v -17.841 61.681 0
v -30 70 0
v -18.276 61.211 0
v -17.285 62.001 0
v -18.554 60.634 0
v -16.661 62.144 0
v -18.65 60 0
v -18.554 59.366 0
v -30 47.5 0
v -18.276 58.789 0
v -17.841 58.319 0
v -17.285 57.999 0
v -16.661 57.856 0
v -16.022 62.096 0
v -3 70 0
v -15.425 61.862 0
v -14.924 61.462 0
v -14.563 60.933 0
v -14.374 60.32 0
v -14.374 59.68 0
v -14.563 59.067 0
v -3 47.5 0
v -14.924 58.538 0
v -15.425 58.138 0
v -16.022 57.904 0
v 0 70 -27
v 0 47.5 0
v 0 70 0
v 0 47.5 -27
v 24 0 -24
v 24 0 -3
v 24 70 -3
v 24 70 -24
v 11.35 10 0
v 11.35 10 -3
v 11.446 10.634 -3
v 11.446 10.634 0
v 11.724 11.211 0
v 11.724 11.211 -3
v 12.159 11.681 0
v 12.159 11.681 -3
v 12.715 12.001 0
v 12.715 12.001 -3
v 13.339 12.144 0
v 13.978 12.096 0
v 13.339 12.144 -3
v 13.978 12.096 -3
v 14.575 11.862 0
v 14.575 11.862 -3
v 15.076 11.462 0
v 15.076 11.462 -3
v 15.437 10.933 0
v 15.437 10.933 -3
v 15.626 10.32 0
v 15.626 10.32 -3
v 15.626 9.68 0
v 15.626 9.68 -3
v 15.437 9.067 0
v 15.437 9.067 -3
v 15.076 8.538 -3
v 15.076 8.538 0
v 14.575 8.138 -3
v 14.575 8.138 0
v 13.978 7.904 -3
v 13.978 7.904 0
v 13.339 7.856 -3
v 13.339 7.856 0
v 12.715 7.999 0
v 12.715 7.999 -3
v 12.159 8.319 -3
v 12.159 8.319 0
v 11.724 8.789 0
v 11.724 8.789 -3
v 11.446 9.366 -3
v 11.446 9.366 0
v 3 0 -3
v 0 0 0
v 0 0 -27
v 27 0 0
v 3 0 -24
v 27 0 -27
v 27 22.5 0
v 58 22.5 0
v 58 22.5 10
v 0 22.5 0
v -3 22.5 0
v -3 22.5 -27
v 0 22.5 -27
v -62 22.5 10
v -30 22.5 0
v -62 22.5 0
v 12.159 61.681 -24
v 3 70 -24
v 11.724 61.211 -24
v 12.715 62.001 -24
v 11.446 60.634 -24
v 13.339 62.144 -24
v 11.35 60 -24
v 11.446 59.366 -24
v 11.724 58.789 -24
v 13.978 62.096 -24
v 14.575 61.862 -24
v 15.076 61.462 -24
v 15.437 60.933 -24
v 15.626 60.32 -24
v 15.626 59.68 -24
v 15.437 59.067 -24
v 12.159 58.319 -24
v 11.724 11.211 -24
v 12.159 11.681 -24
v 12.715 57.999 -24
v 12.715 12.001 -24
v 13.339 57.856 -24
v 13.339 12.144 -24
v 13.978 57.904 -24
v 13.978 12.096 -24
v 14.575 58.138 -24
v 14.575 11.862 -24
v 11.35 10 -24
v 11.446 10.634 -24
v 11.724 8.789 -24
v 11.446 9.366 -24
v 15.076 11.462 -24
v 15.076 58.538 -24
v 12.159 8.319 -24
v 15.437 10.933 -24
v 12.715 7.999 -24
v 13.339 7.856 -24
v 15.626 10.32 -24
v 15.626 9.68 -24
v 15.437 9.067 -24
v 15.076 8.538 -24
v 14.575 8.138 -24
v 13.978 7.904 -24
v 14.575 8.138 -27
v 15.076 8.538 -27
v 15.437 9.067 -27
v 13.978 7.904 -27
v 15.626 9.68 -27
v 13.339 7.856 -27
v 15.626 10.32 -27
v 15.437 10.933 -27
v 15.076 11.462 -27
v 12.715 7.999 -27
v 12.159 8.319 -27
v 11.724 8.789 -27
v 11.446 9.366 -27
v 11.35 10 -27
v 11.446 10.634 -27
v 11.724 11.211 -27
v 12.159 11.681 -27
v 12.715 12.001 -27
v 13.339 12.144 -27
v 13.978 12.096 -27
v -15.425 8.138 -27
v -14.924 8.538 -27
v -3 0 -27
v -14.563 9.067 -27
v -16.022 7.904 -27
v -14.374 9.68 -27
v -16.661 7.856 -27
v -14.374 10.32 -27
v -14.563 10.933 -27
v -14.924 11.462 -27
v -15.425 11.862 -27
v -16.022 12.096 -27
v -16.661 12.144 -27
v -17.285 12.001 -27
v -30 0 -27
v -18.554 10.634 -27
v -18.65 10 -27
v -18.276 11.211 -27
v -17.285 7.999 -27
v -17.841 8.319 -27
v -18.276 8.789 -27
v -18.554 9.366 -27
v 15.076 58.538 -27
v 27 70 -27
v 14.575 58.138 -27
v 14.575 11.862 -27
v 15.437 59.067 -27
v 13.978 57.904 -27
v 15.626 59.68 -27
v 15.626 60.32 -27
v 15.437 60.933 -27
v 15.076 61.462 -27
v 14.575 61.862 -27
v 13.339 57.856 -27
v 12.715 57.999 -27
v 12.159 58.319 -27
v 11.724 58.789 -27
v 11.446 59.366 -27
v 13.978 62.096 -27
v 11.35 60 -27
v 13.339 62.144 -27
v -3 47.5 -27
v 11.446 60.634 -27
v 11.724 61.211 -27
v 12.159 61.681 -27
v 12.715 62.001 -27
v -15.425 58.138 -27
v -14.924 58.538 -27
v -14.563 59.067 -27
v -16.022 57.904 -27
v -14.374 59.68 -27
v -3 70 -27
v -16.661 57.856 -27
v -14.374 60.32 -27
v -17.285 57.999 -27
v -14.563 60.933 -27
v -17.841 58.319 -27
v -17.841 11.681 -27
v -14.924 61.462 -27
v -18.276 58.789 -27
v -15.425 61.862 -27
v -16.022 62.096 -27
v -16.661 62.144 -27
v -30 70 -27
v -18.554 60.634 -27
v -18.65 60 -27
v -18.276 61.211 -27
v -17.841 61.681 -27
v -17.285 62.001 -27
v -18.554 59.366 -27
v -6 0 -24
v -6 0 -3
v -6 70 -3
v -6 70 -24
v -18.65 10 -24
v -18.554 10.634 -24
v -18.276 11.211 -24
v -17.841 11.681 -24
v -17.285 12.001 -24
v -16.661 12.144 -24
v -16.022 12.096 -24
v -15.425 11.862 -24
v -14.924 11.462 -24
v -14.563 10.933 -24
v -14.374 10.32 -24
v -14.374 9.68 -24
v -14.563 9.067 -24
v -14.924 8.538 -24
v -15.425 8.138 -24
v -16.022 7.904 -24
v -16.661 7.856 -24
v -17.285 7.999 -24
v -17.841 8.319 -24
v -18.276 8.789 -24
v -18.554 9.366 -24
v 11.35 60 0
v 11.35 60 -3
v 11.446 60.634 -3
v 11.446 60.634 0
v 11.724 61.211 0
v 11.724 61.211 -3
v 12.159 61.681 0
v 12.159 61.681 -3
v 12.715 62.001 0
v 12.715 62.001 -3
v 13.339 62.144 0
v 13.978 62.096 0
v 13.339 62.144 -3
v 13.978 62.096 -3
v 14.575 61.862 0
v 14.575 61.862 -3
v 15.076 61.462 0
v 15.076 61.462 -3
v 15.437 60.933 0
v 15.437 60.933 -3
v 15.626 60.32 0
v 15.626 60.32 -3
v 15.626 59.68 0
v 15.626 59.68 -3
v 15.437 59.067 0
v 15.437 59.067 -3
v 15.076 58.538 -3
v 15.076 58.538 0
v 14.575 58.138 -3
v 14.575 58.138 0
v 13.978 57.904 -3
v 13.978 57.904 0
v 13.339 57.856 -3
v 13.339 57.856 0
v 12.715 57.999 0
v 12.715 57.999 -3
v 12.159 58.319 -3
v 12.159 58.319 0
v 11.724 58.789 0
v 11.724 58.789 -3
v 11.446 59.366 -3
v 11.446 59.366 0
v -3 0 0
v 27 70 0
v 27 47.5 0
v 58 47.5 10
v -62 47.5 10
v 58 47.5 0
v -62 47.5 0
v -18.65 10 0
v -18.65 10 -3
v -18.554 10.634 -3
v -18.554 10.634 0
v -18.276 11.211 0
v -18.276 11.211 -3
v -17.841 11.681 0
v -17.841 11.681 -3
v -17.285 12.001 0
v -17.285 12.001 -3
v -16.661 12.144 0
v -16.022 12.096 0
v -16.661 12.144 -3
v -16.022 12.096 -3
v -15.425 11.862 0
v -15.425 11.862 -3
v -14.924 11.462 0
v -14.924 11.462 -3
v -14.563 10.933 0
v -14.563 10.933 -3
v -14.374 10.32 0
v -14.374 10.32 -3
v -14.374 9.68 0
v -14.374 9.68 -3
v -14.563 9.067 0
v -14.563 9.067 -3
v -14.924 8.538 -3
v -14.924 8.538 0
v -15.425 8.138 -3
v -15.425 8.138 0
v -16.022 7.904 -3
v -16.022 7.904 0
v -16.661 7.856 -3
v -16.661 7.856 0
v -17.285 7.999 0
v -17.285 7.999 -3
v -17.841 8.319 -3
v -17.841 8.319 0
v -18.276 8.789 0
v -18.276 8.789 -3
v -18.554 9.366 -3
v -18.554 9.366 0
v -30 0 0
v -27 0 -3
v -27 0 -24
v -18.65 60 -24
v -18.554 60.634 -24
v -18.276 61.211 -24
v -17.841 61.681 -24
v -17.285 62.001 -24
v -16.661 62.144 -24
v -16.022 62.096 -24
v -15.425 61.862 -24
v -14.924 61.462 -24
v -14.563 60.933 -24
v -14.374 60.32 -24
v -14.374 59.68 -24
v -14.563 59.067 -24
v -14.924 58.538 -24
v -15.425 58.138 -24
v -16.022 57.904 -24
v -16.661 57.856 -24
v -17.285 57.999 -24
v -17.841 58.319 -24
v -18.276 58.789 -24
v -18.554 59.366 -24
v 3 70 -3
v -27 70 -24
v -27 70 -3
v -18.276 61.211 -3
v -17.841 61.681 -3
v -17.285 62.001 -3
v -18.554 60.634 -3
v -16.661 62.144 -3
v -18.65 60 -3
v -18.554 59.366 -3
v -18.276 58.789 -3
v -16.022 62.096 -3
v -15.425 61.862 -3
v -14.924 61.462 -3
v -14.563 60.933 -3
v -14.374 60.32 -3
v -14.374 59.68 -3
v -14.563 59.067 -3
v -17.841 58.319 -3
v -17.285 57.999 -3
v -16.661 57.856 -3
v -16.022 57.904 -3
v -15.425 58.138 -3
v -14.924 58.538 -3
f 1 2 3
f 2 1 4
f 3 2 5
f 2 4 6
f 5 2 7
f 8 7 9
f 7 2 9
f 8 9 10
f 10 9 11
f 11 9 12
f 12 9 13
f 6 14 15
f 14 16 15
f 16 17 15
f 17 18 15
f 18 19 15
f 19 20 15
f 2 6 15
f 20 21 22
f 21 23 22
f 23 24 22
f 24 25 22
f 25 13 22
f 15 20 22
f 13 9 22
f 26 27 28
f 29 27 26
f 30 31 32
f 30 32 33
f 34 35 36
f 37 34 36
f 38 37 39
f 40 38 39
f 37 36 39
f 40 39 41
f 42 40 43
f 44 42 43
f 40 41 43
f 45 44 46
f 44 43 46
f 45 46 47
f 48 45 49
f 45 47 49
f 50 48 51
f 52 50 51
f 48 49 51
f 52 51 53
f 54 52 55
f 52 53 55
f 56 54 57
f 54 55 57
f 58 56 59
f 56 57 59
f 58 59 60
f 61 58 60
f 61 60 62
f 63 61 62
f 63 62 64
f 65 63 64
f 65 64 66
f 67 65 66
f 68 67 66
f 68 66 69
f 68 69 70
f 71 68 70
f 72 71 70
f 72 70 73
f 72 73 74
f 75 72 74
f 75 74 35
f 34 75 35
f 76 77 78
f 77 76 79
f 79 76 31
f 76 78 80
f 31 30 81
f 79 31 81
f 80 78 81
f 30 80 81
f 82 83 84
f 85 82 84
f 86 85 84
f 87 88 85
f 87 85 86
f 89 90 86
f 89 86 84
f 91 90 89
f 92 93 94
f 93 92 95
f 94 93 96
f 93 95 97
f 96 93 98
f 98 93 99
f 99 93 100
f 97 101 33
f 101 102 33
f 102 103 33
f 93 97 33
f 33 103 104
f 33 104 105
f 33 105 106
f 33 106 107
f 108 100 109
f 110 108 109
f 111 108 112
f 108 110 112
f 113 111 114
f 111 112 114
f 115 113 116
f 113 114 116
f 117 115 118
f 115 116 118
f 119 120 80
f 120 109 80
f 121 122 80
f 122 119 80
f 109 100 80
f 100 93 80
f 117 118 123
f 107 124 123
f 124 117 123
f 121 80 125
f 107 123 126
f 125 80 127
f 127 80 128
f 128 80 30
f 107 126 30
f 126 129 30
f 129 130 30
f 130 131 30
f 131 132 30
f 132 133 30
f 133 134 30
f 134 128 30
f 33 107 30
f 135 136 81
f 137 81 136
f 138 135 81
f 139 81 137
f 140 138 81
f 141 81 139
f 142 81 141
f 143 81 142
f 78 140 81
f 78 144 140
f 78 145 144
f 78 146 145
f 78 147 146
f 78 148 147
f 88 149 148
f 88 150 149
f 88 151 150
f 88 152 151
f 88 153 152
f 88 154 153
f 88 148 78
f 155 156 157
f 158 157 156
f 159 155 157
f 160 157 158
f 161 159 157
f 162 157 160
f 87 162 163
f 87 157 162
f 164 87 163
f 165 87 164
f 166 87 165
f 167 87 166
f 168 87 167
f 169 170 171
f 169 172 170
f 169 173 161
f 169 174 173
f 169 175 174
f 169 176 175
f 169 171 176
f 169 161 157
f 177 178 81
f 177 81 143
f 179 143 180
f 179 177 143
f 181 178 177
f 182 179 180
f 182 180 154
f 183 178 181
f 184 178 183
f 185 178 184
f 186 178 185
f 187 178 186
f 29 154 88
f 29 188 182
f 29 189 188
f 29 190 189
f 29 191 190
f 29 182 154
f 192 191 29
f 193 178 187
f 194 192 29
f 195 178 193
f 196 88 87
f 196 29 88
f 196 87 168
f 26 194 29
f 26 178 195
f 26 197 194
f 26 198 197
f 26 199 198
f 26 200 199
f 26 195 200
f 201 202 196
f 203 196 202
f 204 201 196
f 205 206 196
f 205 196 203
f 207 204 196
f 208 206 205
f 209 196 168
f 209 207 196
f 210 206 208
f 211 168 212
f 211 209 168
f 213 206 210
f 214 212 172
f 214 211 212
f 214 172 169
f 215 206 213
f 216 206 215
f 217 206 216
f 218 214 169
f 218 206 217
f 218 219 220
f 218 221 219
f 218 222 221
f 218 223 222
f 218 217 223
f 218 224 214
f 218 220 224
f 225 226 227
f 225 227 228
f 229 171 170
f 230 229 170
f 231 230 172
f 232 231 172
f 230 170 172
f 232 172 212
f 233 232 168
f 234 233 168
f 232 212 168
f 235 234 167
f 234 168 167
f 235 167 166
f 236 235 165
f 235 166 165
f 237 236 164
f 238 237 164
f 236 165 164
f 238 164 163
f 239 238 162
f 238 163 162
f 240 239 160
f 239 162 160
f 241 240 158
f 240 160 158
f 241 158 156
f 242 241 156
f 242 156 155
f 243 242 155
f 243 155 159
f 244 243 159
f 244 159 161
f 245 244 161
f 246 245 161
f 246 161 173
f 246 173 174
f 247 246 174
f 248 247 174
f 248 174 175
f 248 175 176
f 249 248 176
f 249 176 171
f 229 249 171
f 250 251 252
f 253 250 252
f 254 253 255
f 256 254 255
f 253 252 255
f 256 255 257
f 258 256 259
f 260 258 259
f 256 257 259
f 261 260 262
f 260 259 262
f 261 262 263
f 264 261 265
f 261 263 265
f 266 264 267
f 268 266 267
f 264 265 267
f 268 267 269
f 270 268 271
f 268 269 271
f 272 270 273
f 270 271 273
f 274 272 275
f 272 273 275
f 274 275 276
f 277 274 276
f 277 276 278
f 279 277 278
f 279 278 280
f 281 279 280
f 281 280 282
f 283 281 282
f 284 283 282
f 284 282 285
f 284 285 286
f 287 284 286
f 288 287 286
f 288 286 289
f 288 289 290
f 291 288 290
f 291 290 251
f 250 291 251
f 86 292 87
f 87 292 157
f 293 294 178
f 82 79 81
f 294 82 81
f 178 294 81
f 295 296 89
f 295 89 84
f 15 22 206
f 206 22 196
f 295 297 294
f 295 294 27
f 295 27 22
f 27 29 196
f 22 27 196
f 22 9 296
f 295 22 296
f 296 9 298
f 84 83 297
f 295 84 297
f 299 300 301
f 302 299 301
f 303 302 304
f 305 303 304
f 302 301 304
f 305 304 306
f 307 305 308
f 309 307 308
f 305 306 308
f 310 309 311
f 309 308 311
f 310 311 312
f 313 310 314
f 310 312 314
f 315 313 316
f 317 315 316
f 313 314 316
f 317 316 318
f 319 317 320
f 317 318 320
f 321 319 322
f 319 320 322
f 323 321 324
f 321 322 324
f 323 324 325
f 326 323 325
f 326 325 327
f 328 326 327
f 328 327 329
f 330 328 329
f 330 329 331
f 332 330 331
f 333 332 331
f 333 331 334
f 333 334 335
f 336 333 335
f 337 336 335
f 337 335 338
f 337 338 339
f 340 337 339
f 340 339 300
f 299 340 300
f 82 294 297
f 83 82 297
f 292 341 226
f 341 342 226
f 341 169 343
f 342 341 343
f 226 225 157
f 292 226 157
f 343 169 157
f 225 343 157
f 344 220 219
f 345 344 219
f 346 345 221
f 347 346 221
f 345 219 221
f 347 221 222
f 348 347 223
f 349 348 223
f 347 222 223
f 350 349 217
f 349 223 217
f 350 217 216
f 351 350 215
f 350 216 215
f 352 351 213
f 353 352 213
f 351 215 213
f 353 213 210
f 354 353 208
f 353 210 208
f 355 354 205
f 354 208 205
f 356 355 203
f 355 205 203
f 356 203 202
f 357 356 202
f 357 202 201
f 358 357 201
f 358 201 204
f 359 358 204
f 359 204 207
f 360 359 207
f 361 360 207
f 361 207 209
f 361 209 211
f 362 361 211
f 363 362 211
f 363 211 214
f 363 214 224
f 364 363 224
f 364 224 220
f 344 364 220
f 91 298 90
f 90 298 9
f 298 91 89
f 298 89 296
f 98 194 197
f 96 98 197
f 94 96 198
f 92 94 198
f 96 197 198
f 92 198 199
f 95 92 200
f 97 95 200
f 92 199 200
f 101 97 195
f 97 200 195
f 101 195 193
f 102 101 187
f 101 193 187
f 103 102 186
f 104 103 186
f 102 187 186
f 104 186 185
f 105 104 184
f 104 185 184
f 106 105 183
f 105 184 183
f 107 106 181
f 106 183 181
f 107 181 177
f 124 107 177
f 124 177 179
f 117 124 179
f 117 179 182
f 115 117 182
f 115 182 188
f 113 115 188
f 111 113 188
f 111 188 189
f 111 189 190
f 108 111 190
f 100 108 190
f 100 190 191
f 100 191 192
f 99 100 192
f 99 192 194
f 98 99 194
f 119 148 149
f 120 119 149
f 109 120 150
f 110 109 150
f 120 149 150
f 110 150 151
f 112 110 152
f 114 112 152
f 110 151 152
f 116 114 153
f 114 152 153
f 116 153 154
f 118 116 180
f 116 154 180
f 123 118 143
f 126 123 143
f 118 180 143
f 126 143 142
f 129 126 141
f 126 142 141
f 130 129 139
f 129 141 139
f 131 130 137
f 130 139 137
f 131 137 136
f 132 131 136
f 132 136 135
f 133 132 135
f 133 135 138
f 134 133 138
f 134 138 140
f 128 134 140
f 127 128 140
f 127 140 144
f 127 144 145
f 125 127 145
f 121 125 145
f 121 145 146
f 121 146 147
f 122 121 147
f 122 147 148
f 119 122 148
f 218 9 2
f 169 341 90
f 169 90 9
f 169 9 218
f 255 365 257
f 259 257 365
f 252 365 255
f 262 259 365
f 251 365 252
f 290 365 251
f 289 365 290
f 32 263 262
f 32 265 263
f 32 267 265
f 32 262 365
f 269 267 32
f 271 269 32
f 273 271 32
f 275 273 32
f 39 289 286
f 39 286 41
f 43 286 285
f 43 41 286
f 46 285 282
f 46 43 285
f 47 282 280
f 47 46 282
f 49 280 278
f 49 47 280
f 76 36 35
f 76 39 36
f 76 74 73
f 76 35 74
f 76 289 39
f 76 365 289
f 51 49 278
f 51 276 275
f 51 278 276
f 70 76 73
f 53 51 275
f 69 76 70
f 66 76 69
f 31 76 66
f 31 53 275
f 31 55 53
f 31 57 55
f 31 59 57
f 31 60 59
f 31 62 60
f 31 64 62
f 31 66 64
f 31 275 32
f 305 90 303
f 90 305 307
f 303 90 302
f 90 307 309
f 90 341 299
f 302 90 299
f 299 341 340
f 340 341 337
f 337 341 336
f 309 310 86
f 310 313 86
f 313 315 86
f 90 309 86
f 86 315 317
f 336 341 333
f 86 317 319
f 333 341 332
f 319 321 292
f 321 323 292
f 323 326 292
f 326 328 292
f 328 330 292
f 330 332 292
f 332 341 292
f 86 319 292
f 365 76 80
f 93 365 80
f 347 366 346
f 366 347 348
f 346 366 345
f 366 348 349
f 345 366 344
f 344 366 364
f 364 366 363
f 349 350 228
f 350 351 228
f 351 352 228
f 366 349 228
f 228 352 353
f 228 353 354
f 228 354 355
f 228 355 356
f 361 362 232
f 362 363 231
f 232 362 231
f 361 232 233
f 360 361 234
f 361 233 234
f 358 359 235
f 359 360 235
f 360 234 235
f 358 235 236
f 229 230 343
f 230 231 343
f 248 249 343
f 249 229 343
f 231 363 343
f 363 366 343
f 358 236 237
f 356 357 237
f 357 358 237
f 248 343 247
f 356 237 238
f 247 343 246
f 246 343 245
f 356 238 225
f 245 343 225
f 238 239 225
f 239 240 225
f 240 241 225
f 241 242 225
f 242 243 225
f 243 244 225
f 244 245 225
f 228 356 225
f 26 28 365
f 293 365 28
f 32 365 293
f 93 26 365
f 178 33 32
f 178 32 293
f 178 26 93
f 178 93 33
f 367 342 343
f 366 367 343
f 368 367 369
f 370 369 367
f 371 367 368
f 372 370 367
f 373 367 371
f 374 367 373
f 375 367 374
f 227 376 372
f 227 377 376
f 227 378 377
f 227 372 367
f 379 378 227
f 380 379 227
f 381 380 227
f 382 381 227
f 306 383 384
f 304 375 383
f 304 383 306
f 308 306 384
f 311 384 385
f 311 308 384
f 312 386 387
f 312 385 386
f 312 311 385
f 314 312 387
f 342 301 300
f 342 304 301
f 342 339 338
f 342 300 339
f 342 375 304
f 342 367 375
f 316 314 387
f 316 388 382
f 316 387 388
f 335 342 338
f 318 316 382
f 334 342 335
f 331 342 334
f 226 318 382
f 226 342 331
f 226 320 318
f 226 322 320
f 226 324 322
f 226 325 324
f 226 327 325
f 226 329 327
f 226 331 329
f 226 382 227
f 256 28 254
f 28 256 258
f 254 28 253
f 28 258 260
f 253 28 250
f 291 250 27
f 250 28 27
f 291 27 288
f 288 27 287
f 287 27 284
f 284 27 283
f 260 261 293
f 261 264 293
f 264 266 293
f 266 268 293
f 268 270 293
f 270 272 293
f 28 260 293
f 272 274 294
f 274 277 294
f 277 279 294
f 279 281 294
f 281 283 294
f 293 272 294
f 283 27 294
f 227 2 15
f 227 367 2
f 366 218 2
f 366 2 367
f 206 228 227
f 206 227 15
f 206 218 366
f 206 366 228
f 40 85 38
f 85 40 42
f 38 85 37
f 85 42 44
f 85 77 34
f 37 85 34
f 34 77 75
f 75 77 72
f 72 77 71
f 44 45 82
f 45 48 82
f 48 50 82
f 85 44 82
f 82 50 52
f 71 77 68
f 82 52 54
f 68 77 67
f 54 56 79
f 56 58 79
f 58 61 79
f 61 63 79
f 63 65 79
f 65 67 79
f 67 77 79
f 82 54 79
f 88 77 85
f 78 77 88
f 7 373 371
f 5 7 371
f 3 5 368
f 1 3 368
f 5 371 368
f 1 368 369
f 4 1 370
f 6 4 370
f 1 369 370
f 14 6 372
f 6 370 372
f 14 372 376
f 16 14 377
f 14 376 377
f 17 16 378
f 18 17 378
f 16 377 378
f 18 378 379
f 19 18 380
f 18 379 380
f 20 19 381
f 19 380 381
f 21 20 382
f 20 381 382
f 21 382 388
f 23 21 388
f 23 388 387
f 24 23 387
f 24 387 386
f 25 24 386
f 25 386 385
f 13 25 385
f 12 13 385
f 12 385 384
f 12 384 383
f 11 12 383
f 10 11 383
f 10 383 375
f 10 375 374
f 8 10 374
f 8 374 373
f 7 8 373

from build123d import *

# Parameters (mm, degrees)
SKETCH1_W             = 27
SKETCH1_H             = 27
SKETCH1_W_2           = 21
SKETCH1_H_2           = 21
BOSS_EXTRUDE1_DEPTH   = 70
BOSS_EXTRUDE1_2_DEPTH = 70
SKETCH2_W             = 120
SKETCH2_H             = 25
BOSS_EXTRUDE2_DEPTH   = 10
SKETCH3_W             = 3
SKETCH3_H             = 25
BOSS_EXTRUDE3_DEPTH   = 27
SKETCH4_R             = 2.15
CUT_EXTRUDE1_DEPTH    = 38


with BuildPart() as part:
    # Sketch1 → Boss-Extrude1 (new body)
    with BuildSketch(Plane(origin=(0, 0, 0), x_dir=(1, 0, 0), z_dir=(0, 1, 0))):
        with Locations((13.5, 13.5)):
            Rectangle(SKETCH1_W, SKETCH1_H)
        with Locations((13.5, 13.5)):
            Rectangle(SKETCH1_W_2, SKETCH1_H_2, mode=Mode.SUBTRACT)
    extrude(amount=BOSS_EXTRUDE1_DEPTH)



with BuildPart() as body_2:
    # Sketch1 → Boss-Extrude1 2 (new body)
    with BuildSketch(Plane(origin=(0, 0, 0), x_dir=(1, 0, 0), z_dir=(0, 1, 0))):
        with Locations((-16.5, 13.5)):
            Rectangle(SKETCH1_W, SKETCH1_H)
        with Locations((-16.5, 13.5)):
            Rectangle(SKETCH1_W_2, SKETCH1_H_2, mode=Mode.SUBTRACT)
    extrude(amount=BOSS_EXTRUDE1_2_DEPTH)


with BuildPart() as part_1:
    add(part.part)

    add(body_2.part)  # Boss-Extrude2 merges body 2
    # Sketch2 → Boss-Extrude2 (add)
    with BuildSketch(Plane.XY):
        with Locations((-2, 35)):
            Rectangle(SKETCH2_W, SKETCH2_H)
    extrude(amount=BOSS_EXTRUDE2_DEPTH)

    # Sketch3 → Boss-Extrude3 (add)
    with BuildSketch(Plane(origin=(0, 0, -27), x_dir=(-1, 0, 0), z_dir=(0, 0, -1))):
        with Locations((1.5, 35)):
            Rectangle(SKETCH3_W, SKETCH3_H)
    extrude(amount=-BOSS_EXTRUDE3_DEPTH)

    # Sketch4 → Cut-Extrude1 (cut, through all)
    with BuildSketch(Plane(origin=(0, 0, -27), x_dir=(-1, 0, 0), z_dir=(0, 0, -1))):
        with Locations((-13.5, 60)):
            Circle(SKETCH4_R)
        with Locations((16.5, 60)):
            Circle(SKETCH4_R)
        with Locations((-13.5, 10)):
            Circle(SKETCH4_R)
        with Locations((16.5, 10)):
            Circle(SKETCH4_R)
    extrude(amount=-CUT_EXTRUDE1_DEPTH, mode=Mode.SUBTRACT)


solid = part_1.part
